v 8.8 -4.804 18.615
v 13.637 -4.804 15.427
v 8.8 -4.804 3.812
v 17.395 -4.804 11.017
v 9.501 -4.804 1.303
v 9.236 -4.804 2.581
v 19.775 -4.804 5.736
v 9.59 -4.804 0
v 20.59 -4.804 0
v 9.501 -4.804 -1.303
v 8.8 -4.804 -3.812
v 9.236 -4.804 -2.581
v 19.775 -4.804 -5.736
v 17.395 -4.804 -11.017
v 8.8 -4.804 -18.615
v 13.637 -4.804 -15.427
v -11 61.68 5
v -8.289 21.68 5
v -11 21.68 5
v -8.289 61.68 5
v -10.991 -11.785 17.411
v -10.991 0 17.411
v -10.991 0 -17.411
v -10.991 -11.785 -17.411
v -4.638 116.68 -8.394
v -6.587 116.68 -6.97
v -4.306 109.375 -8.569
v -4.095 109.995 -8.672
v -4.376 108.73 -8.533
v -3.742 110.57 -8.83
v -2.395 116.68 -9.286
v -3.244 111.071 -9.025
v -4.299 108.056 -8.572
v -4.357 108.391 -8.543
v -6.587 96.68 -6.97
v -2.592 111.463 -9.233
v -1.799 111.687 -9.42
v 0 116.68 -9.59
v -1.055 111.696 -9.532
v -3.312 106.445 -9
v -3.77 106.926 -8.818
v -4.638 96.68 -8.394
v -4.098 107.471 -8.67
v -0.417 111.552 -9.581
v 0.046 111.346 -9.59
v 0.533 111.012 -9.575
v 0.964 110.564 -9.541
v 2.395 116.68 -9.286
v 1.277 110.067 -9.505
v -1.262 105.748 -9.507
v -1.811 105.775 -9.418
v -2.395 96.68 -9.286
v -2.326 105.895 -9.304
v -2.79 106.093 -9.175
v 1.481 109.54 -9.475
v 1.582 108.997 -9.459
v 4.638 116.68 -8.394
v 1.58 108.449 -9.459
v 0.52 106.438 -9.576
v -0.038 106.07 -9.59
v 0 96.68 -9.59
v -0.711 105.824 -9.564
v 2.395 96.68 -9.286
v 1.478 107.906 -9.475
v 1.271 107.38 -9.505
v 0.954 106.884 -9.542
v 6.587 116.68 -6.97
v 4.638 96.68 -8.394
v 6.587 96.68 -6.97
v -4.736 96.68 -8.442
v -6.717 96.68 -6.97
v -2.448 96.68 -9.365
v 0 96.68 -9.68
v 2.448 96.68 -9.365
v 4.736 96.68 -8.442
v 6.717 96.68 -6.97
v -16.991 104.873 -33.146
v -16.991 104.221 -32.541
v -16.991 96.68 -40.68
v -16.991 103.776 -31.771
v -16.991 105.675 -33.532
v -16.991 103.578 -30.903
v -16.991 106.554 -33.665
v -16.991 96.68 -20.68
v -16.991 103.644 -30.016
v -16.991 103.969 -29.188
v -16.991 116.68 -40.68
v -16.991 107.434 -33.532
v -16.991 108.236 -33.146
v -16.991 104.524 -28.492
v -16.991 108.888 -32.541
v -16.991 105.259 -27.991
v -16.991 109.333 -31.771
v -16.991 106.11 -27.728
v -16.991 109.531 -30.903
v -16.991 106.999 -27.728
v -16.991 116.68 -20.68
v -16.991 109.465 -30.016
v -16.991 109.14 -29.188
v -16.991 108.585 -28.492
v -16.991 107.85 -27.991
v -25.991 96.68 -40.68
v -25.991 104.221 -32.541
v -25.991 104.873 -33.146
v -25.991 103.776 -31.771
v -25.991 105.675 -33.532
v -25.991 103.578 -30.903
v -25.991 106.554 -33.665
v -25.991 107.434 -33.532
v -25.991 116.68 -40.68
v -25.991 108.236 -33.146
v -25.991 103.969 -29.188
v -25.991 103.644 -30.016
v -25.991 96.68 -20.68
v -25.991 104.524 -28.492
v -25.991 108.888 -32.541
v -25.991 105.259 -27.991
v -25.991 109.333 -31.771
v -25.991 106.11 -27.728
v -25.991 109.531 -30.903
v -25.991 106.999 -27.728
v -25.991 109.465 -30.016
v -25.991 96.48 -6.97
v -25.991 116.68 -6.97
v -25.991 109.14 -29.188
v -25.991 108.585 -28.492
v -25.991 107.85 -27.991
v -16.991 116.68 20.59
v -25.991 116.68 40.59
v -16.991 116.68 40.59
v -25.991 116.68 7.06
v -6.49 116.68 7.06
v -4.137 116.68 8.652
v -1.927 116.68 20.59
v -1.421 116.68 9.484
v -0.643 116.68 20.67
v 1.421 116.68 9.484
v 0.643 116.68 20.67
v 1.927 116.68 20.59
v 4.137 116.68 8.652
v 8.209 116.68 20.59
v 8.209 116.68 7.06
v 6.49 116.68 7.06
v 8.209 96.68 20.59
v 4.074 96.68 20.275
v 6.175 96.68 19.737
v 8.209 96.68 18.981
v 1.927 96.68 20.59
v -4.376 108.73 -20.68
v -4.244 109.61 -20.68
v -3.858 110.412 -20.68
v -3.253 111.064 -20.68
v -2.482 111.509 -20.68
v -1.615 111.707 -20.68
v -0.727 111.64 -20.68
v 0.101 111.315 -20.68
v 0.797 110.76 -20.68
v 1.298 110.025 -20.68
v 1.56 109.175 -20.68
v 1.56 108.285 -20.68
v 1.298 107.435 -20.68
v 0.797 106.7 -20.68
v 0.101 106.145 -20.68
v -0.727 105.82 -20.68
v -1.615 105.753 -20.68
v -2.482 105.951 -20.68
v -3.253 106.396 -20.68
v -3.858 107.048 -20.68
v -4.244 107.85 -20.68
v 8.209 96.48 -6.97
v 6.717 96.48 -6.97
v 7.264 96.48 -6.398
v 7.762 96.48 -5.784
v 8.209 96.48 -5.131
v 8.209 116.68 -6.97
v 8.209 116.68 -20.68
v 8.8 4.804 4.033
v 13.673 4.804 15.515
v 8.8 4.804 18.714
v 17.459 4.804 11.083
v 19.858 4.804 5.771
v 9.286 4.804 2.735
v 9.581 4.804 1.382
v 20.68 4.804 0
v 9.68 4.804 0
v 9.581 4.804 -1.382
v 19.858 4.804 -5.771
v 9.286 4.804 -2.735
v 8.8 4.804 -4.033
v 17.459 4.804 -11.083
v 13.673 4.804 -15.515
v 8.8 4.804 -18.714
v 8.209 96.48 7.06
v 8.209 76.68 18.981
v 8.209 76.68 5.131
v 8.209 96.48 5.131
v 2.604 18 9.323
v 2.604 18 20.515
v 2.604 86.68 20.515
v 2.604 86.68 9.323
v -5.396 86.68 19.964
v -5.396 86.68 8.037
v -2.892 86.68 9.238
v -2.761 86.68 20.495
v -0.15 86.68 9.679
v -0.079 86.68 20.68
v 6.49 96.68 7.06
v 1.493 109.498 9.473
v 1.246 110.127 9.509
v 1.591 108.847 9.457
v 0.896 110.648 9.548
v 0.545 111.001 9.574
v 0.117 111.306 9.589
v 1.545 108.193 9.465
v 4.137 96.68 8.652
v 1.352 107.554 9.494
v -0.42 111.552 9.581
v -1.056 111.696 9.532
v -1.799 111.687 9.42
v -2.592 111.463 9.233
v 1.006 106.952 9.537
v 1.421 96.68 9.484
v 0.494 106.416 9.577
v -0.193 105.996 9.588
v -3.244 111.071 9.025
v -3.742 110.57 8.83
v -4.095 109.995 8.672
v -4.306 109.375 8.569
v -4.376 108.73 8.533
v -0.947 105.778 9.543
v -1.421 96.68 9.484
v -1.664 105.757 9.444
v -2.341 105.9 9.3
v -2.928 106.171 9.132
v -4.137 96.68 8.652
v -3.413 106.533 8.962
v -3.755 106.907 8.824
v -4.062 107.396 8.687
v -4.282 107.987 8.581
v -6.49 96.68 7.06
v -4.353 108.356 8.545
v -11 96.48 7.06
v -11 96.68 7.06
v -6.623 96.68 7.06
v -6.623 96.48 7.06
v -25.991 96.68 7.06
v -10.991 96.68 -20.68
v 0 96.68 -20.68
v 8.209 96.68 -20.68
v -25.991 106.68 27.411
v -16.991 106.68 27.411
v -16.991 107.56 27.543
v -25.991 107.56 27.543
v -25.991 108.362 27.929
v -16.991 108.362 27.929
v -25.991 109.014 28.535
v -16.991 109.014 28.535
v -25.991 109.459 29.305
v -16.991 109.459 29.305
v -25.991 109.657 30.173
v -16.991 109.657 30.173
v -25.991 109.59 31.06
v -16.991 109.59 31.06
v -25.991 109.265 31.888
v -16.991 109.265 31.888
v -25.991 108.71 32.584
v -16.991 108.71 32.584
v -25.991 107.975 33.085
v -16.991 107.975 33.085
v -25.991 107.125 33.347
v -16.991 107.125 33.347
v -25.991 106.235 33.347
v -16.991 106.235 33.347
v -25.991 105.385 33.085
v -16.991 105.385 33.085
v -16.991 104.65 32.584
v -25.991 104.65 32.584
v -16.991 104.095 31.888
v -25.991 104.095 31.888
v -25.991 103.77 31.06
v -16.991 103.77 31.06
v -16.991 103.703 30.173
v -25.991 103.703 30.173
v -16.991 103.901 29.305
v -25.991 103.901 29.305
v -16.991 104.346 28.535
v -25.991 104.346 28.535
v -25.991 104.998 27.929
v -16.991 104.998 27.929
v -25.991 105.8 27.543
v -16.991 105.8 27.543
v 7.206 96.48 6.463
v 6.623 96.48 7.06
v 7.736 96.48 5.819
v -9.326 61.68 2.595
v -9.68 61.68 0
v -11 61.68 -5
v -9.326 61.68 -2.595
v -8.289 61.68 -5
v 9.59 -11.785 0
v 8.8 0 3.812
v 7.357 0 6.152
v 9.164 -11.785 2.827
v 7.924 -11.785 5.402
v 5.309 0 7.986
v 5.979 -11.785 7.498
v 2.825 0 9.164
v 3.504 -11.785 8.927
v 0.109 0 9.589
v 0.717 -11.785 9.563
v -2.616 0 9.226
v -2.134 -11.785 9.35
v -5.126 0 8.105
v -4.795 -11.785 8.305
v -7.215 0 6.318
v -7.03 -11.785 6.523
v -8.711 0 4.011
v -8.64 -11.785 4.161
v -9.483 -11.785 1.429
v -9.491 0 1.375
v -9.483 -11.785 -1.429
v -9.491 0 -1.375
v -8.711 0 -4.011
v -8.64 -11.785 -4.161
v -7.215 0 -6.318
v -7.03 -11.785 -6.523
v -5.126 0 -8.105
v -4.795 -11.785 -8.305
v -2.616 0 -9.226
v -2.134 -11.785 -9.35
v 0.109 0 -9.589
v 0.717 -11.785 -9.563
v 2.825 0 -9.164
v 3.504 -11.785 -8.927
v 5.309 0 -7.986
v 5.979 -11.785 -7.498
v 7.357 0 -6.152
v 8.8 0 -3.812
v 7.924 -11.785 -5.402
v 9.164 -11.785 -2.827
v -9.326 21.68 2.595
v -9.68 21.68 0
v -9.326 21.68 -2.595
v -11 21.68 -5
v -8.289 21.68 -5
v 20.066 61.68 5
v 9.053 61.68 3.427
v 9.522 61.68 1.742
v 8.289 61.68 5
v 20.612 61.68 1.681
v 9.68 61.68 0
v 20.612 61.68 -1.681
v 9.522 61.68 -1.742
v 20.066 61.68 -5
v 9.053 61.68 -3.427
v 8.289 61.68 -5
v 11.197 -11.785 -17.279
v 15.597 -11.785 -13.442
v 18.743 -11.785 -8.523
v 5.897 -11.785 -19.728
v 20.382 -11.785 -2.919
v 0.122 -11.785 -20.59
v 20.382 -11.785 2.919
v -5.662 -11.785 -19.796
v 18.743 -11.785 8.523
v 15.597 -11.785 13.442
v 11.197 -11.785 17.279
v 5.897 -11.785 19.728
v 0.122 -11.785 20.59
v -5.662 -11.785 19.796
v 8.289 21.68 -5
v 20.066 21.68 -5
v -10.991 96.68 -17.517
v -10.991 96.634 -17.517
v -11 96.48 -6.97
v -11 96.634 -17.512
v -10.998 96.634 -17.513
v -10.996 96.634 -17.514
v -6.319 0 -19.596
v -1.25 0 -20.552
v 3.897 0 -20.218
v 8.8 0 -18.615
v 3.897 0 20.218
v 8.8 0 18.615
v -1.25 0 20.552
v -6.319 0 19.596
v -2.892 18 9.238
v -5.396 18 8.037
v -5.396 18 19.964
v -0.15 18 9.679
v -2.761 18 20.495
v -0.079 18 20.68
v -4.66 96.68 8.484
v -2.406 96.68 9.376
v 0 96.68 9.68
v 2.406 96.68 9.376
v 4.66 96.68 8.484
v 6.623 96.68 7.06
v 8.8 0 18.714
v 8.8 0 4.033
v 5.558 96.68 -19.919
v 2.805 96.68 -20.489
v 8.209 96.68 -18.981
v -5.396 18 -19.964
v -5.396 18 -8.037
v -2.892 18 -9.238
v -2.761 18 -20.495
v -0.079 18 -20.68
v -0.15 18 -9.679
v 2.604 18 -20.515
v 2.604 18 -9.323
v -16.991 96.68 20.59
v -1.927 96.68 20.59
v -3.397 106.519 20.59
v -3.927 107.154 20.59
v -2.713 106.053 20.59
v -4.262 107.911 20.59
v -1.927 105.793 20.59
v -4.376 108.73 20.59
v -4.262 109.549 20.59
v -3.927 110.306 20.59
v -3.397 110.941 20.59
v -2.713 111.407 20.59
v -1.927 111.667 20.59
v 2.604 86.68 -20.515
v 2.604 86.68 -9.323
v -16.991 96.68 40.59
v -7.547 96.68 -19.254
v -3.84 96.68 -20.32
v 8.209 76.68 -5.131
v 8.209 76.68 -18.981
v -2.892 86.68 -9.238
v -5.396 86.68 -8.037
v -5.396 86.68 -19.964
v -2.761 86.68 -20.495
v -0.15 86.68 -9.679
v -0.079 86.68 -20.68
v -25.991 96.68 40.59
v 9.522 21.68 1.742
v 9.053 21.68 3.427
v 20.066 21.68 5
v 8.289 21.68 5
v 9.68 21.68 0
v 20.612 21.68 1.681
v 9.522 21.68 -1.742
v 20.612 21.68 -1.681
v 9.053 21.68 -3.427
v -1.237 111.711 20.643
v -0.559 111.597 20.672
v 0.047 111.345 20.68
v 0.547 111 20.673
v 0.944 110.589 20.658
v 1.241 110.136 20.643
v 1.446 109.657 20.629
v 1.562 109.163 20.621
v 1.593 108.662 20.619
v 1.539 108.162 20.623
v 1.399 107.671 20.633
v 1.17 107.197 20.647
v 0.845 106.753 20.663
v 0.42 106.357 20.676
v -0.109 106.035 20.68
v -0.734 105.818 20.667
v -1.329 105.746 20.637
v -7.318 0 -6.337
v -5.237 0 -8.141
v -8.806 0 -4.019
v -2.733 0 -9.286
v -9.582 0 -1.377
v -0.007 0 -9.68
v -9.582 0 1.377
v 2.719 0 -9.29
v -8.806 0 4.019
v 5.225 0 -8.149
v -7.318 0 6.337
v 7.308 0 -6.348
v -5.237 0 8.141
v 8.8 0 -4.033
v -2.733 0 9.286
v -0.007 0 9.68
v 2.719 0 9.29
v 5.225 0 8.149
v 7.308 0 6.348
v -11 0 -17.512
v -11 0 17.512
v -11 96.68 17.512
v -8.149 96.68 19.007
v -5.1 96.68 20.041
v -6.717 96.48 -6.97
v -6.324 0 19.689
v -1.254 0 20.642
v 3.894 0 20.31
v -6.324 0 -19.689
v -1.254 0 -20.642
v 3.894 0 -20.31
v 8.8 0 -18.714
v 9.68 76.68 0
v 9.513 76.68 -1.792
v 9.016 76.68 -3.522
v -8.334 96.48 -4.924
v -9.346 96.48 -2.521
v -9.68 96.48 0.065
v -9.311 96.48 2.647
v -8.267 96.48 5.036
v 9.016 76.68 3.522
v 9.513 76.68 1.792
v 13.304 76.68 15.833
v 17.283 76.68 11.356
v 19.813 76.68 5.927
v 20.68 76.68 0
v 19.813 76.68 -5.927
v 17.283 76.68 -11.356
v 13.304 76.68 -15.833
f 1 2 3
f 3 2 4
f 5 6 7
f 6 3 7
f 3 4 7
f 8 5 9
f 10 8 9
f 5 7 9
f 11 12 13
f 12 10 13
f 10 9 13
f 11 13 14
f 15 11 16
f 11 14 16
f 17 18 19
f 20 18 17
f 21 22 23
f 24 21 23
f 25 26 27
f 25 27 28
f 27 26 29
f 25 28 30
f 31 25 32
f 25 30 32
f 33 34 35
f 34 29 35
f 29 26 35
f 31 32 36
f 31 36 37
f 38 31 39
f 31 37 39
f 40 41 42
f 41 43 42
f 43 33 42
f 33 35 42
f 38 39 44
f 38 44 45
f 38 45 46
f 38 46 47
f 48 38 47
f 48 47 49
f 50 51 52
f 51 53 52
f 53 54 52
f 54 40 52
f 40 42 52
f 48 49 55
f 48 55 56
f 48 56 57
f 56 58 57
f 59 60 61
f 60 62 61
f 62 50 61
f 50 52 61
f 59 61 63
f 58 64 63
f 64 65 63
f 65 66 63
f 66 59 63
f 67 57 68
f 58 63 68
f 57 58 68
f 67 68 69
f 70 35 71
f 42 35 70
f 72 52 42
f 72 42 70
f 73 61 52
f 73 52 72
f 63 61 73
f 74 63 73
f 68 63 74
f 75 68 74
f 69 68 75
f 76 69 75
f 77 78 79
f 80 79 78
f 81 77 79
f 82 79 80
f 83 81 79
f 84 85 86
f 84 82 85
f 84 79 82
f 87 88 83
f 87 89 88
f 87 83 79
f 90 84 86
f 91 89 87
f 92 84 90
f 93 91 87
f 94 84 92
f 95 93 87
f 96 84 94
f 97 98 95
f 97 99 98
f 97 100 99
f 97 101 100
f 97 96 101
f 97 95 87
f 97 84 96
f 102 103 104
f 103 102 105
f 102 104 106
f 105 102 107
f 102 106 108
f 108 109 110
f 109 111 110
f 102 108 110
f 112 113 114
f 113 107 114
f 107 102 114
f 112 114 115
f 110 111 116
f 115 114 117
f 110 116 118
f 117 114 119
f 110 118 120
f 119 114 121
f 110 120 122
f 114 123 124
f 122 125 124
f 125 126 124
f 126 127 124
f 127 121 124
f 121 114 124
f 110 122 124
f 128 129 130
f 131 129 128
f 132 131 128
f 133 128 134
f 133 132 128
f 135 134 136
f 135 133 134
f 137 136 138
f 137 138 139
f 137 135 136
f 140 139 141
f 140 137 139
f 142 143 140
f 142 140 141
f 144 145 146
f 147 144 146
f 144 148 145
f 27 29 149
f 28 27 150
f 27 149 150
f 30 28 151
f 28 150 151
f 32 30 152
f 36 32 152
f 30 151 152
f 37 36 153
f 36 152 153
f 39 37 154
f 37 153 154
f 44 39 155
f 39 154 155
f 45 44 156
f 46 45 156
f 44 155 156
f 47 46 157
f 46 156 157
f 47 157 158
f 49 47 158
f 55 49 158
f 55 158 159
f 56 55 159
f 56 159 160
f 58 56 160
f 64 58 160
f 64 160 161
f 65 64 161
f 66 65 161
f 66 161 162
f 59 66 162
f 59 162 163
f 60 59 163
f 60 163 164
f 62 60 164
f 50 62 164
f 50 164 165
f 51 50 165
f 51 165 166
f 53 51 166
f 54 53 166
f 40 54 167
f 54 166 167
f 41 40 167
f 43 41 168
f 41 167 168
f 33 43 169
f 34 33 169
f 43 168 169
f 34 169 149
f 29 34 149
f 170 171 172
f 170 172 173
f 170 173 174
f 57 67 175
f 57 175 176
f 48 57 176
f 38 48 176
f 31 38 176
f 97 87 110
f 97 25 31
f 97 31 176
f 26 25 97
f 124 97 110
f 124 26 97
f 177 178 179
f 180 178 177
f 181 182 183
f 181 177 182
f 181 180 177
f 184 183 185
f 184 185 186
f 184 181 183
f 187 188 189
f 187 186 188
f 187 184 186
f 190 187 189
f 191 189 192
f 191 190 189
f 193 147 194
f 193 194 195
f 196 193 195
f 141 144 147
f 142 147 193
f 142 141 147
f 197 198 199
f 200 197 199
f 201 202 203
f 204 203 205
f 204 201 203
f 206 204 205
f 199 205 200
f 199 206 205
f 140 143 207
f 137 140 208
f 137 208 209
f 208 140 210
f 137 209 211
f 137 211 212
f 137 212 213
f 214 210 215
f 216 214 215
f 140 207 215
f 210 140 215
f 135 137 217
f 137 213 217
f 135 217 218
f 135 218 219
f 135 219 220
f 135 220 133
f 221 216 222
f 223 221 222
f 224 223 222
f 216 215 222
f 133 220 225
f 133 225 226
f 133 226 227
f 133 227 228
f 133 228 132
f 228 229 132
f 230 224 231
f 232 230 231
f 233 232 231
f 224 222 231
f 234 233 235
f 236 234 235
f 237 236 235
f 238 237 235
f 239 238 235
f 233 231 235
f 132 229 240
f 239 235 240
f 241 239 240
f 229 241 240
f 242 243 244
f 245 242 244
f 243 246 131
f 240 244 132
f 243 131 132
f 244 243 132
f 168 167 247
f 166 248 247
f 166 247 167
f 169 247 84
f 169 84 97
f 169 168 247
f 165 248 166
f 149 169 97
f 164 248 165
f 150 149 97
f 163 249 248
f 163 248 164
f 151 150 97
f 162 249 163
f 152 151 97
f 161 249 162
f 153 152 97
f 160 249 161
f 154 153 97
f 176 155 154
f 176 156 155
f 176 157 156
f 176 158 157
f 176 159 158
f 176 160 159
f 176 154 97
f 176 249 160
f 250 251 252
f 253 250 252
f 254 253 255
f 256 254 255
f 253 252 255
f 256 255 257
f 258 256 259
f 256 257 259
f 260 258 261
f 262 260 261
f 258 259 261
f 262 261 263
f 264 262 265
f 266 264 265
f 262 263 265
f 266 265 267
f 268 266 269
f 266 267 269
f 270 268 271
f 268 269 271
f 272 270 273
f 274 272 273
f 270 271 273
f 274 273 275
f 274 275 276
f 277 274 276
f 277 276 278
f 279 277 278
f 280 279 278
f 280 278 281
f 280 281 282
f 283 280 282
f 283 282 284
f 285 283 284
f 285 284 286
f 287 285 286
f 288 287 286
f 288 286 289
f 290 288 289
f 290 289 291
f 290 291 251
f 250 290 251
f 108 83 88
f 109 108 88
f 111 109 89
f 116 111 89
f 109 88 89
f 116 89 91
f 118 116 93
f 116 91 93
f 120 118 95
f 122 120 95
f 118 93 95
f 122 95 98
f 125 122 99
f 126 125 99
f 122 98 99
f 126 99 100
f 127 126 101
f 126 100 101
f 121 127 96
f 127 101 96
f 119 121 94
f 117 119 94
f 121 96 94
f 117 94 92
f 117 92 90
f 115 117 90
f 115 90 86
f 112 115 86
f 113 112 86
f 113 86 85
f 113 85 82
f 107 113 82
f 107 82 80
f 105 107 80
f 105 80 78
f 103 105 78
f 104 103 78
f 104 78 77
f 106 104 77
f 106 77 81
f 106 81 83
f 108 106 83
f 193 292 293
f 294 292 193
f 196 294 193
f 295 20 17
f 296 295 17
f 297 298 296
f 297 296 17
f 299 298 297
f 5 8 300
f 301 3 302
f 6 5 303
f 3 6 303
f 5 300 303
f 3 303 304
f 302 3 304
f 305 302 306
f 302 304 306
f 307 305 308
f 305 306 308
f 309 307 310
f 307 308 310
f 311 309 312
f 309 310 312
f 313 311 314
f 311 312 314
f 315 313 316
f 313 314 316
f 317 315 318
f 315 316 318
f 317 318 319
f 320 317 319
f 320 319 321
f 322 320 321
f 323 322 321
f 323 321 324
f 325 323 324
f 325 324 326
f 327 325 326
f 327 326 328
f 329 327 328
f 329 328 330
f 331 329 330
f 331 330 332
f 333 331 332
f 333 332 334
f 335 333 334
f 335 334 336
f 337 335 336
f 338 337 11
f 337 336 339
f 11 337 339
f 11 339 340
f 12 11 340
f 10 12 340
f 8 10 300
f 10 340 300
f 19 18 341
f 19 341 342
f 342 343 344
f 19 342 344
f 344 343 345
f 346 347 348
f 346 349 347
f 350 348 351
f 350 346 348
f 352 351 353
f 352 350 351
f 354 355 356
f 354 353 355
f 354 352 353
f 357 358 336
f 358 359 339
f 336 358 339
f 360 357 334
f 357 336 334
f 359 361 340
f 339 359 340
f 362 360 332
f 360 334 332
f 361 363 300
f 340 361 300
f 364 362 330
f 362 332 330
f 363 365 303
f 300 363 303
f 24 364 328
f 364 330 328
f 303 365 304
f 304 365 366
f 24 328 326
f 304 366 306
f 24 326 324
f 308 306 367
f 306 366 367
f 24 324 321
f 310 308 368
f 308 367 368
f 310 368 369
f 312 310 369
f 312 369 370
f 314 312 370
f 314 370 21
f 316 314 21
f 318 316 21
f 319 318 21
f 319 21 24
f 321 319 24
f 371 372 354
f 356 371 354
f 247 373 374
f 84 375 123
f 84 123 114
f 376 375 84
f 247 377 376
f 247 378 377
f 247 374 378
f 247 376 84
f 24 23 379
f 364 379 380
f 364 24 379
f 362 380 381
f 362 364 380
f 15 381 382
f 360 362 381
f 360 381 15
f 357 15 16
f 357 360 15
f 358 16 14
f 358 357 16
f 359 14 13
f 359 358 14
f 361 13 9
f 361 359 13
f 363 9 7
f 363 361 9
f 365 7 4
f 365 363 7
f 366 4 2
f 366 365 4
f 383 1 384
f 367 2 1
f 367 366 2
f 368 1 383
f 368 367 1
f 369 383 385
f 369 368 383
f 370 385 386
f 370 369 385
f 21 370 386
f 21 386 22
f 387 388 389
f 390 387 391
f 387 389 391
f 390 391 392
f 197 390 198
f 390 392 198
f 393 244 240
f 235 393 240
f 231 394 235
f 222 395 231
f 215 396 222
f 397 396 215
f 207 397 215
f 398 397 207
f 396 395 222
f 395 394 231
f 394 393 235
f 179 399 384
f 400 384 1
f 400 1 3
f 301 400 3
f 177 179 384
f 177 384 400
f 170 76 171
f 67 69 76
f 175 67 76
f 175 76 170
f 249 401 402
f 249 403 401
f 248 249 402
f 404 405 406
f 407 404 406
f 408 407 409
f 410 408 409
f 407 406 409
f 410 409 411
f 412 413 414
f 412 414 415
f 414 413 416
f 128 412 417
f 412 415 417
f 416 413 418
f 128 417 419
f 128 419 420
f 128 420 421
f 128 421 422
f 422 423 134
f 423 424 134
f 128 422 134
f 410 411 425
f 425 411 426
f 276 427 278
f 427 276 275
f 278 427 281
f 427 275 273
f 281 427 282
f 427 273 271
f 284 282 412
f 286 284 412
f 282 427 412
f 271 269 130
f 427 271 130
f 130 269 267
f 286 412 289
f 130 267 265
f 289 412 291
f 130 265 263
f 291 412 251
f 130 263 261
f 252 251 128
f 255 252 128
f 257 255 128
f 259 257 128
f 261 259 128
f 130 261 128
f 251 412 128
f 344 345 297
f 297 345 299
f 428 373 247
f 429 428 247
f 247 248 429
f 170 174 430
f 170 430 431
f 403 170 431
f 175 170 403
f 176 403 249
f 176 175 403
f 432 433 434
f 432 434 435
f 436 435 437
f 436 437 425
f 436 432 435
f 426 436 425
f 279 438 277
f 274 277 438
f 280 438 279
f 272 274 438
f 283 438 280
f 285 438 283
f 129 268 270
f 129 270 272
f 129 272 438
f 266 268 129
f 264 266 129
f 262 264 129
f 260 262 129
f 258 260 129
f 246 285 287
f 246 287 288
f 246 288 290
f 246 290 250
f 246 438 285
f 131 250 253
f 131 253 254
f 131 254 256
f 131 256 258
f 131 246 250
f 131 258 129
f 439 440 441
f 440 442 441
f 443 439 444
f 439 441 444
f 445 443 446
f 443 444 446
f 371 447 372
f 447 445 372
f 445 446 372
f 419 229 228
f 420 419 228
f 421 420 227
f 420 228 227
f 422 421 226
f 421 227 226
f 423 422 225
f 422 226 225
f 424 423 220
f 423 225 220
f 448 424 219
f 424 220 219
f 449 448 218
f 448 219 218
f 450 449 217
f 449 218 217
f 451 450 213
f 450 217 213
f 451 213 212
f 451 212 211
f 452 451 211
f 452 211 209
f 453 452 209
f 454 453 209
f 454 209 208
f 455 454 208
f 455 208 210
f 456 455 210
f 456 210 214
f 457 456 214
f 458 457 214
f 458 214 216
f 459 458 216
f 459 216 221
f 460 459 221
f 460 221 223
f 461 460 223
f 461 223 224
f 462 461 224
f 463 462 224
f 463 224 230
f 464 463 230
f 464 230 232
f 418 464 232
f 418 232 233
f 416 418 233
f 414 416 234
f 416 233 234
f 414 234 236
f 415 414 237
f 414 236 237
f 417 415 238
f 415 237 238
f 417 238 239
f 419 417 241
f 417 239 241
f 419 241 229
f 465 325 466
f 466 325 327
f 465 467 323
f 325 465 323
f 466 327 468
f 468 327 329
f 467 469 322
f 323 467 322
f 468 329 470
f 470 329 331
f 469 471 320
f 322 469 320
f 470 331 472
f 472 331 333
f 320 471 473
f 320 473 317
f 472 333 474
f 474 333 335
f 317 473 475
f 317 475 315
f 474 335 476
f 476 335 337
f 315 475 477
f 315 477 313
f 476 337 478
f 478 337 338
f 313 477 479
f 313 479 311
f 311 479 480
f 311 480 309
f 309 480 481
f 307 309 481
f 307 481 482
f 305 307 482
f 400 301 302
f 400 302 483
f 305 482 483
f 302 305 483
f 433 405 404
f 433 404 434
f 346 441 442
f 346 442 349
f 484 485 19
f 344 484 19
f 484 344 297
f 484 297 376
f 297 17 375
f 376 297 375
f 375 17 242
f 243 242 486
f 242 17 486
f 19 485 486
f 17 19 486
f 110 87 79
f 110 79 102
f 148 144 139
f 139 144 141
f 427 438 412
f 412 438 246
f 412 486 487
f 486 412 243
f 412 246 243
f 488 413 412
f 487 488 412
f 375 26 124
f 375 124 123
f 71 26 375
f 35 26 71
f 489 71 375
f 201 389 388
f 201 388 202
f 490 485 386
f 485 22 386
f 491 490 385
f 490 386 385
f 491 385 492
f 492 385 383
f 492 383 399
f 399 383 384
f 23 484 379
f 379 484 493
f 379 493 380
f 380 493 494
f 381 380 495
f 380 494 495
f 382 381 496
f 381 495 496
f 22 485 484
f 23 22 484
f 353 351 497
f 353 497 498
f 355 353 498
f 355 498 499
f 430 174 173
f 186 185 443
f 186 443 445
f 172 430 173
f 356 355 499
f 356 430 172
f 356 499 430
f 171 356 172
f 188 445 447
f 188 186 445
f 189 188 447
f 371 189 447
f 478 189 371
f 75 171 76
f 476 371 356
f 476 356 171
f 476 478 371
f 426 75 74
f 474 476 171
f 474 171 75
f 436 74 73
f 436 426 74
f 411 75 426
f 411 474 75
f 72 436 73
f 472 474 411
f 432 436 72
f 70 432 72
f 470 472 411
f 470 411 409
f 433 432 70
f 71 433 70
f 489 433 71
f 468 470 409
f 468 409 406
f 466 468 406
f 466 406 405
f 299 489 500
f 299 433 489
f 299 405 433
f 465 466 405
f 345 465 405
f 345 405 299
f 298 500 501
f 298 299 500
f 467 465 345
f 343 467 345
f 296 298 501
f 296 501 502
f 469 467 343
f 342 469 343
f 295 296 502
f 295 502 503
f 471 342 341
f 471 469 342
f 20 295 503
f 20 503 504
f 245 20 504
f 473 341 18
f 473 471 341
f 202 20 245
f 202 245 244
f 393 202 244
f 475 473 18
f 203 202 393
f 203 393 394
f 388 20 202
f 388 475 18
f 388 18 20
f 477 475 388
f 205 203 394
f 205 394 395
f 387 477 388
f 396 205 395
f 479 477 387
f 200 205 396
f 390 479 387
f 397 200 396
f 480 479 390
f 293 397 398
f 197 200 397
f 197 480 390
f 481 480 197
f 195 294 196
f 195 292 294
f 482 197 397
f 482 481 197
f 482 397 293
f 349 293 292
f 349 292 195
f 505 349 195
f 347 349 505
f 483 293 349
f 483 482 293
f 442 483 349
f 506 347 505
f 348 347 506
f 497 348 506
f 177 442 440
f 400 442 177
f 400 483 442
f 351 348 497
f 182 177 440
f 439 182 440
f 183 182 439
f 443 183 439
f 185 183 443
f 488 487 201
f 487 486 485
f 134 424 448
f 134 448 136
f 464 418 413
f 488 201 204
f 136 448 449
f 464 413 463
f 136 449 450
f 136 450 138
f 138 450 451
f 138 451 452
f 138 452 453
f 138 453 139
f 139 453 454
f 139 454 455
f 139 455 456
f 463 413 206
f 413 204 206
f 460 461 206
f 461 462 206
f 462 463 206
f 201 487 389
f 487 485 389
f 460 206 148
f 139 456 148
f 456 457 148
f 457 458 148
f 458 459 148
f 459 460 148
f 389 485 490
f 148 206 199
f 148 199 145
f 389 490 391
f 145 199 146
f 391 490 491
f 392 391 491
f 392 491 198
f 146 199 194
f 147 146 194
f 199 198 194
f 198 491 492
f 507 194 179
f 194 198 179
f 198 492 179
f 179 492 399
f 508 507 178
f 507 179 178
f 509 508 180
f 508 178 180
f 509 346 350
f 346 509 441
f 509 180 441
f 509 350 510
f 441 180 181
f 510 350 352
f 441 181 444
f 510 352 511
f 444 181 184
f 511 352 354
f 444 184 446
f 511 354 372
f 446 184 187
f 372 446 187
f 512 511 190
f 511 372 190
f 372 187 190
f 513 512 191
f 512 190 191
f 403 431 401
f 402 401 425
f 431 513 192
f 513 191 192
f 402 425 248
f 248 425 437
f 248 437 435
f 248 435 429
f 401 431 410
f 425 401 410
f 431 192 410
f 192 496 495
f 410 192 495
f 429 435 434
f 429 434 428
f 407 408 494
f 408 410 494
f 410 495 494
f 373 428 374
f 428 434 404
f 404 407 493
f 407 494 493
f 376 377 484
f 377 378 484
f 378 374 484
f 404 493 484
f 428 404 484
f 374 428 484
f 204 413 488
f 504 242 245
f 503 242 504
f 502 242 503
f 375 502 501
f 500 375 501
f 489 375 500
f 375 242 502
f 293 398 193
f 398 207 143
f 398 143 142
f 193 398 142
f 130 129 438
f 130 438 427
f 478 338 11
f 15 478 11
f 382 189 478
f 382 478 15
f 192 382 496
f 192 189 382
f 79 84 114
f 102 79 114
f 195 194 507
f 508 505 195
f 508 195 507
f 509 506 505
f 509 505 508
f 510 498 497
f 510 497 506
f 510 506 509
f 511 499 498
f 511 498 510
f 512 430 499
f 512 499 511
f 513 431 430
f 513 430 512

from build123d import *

# Parameters (mm, degrees)
SKETCH_1_R           = 20.68
SKETCH_1_R_2         = 9.68
EXTRUDE_1_DEPTH      = 116.68
SKETCH_11_W          = 27
SKETCH_11_H          = 150
CUT_EXTRUDE_3_DEPTH  = 40
SKETCH_13_W          = 10
SKETCH_13_H          = 128.345013401
CUT_EXTRUDE_7_DEPTH  = 126.614916312
SKETCH_15_W          = 8
SKETCH_15_H          = 68.68
CUT_EXTRUDE_9_DEPTH  = 48
SKETCH_16_W          = 15.549431524
SKETCH_16_H          = 20
SKETCH_16_W_2        = 15.459431524
EXTRUDE_4_DEPTH      = 19.2
SKETCH_17_W          = 19.20851187
SKETCH_17_H          = 14.03
CUT_EXTRUDE_10_DEPTH = 20.2
SKETCH_18_R          = 9.59
CUT_EXTRUDE_11_DEPTH = 121.289430957
SKETCH_21_R          = 2.985
CUT_EXTRUDE_12_DEPTH = 55.2
EXTRUDE_START        = 55.2
SKETCH_24_R          = 20.59
SKETCH_24_R_2        = 9.59
EXTRUDE_2_DEPTH      = 55.2
CUT_EXTRUDE_13_DEPTH = 55.2
SKETCH_26_W          = 10.00851187
SKETCH_26_H          = 41.68
CUT_EXTRUDE_15_DEPTH = 55.2
SKETCH_27_W          = 10
SKETCH_27_H          = 40
CUT_EXTRUDE_16_DEPTH = 55.2
SKETCH_28_W          = 44.880694938
SKETCH_28_H          = 9.608044066
CUT_EXTRUDE_17_DEPTH = 12.2
SKETCH_35_W          = 13.53
SKETCH_35_H          = 20
EXTRUDE_10_DEPTH     = 15
EXTRUDE_11_DEPTH     = 15
SKETCH_37_W          = 9
SKETCH_37_H          = 20
EXTRUDE_12_DEPTH     = 20
SKETCH_38_W          = 9
SKETCH_38_H          = 20
EXTRUDE_13_DEPTH     = 20
SKETCH_42_R          = 2.985
CUT_EXTRUDE_21_DEPTH = 20


with BuildPart() as part:
    # 草圖1 → 伸長-薄件1 (new body)
    with BuildSketch(Plane(origin=(0, 0, 0), x_dir=(1, 0, 0), z_dir=(0, 1, 0))):
        Circle(SKETCH_1_R)
        Circle(SKETCH_1_R_2, mode=Mode.SUBTRACT)
    extrude(amount=EXTRUDE_1_DEPTH)

    # 草圖11 → 除料-伸長3 (cut)
    with BuildSketch(Plane(origin=(0, 116.68, 0), x_dir=(1, 0, 0), z_dir=(0, 1, 0))):
        with Locations((21.70851187, -44.235815192)):
            Rectangle(SKETCH_11_W, SKETCH_11_H)
    extrude(amount=-CUT_EXTRUDE_3_DEPTH, mode=Mode.SUBTRACT)

    # 草圖13 → 除料-伸長7 (cut, through all)
    with BuildSketch(Plane.XY.offset(21)):
        with Locations((-16, 58.612182466)):
            Rectangle(SKETCH_13_W, SKETCH_13_H)
    extrude(amount=-CUT_EXTRUDE_7_DEPTH, mode=Mode.SUBTRACT)

    # 草圖15 → 除料-伸長9 (cut)
    with BuildSketch(Plane.XY.offset(21)):
        with Locations((-1.395744065, 52.34)):
            Rectangle(SKETCH_15_W, SKETCH_15_H)
    extrude(amount=-CUT_EXTRUDE_9_DEPTH, mode=Mode.SUBTRACT)

    # 草圖16 → 填料-伸長4 (add)
    with BuildSketch(Plane(origin=(8.20851187, 0, 0), x_dir=(0, 0, -1), z_dir=(1, 0, 0))):
        with Locations((12.905284238, 106.68)):
            Rectangle(SKETCH_16_W, SKETCH_16_H)
        with Locations((-12.860284238, 106.68)):
            Rectangle(SKETCH_16_W_2, SKETCH_16_H)
    extrude(amount=-EXTRUDE_4_DEPTH)

    # 草圖17 → 除料-伸長10 (cut)
    with BuildSketch(Plane(origin=(0, 116.68, 0), x_dir=(1, 0, 0), z_dir=(0, 1, 0))):
        with Locations((-1.395744065, -0.045)):
            Rectangle(SKETCH_17_W, SKETCH_17_H)
    extrude(amount=-CUT_EXTRUDE_10_DEPTH, mode=Mode.SUBTRACT)

    # 草圖18 → 除料-伸長11 (cut, through all)
    with BuildSketch(Plane.XZ):
        with Locations(Location((0, 0, 0), (0, 0, 90))):
            Circle(SKETCH_18_R)
    extrude(amount=-CUT_EXTRUDE_11_DEPTH, mode=Mode.SUBTRACT)

    # 草圖21 → 除料-伸長12 (cut)
    with BuildSketch(Plane(origin=(0, 0, -20.68), x_dir=(-1, 0, 0), z_dir=(0, 0, -1))):
        with Locations((1.39148813, 108.73)):
            Circle(SKETCH_21_R)
    extrude(amount=-CUT_EXTRUDE_12_DEPTH, mode=Mode.SUBTRACT)

    # 草圖24 → 伸長-薄件2 (add)
    with BuildSketch(Plane.XZ.offset(EXTRUDE_START)):
        Circle(SKETCH_24_R)
        Circle(SKETCH_24_R_2, mode=Mode.SUBTRACT)
    extrude(amount=-EXTRUDE_2_DEPTH)

    # 草圖25 → 除料-伸長13 (cut)
    with BuildSketch(Plane.XY.offset(21)):
        Polygon((-1.39148813, -11.785), (22.612379708, -11.785), (22.612379708, -63.873337429), (-22.749525245, -63.873337429), (-22.749525245, -11.785), align=None)
    extrude(amount=-CUT_EXTRUDE_13_DEPTH, mode=Mode.SUBTRACT)

    # 草圖26 → 除料-伸長15 (cut)
    with BuildSketch(Plane(origin=(0, 0, 0), x_dir=(1, 0, 0), z_dir=(0, 1, 0))):
        with Locations((-15.995744065, -0.16)):
            Rectangle(SKETCH_26_W, SKETCH_26_H)
    extrude(amount=-CUT_EXTRUDE_15_DEPTH, mode=Mode.SUBTRACT)

    # 草圖27 → 除料-伸長16 (cut)
    with BuildSketch(Plane(origin=(21, 0, 0), x_dir=(0, 0, -1), z_dir=(1, 0, 0))):
        with Locations((0, 41.68)):
            Rectangle(SKETCH_27_W, SKETCH_27_H)
    extrude(amount=-CUT_EXTRUDE_16_DEPTH, mode=Mode.SUBTRACT)

    # 草圖28 → 除料-伸長17 (cut)
    with BuildSketch(Plane(origin=(21, 0, 0), x_dir=(0, 0, -1), z_dir=(1, 0, 0))):
        Rectangle(SKETCH_28_W, SKETCH_28_H)
    extrude(amount=-CUT_EXTRUDE_17_DEPTH, mode=Mode.SUBTRACT)

    # 草圖35 → 填料-伸長10 (add)
    with BuildSketch(Plane.ZY.offset(10.99148813)):
        with Locations((13.825, 106.68)):
            Rectangle(SKETCH_35_W, SKETCH_35_H)
    extrude(amount=EXTRUDE_10_DEPTH)

    # 草圖36 → 填料-伸長11 (add)
    with BuildSketch(Plane.ZY.offset(10.99148813)):
        Polygon((-20.68, 116.68), (-6.97, 116.68), (-6.97, 96.48), (-20.68, 96.68), align=None)
    extrude(amount=EXTRUDE_11_DEPTH)

    # 草圖37 → 填料-伸長12 (add)
    with BuildSketch(Plane.XY.offset(20.59)):
        with Locations((-21.49148813, 106.68)):
            Rectangle(SKETCH_37_W, SKETCH_37_H)
    extrude(amount=EXTRUDE_12_DEPTH)

    # 草圖38 → 填料-伸長13 (add)
    with BuildSketch(Plane(origin=(0, 0, -20.68), x_dir=(-1, 0, 0), z_dir=(0, 0, -1))):
        with Locations((21.49148813, 106.68)):
            Rectangle(SKETCH_38_W, SKETCH_38_H)
    extrude(amount=EXTRUDE_13_DEPTH)

    # 草圖42 → 除料-伸長21 (cut)
    with BuildSketch(Plane(origin=(-16.99148813, 0, 0), x_dir=(0, 0, -1), z_dir=(1, 0, 0))):
        with Locations((30.68, 106.554418142)):
            Circle(SKETCH_42_R)
        with Locations((-30.395640125, 106.68)):
            Circle(SKETCH_42_R)
    extrude(amount=-CUT_EXTRUDE_21_DEPTH, mode=Mode.SUBTRACT)


solid = part.part
